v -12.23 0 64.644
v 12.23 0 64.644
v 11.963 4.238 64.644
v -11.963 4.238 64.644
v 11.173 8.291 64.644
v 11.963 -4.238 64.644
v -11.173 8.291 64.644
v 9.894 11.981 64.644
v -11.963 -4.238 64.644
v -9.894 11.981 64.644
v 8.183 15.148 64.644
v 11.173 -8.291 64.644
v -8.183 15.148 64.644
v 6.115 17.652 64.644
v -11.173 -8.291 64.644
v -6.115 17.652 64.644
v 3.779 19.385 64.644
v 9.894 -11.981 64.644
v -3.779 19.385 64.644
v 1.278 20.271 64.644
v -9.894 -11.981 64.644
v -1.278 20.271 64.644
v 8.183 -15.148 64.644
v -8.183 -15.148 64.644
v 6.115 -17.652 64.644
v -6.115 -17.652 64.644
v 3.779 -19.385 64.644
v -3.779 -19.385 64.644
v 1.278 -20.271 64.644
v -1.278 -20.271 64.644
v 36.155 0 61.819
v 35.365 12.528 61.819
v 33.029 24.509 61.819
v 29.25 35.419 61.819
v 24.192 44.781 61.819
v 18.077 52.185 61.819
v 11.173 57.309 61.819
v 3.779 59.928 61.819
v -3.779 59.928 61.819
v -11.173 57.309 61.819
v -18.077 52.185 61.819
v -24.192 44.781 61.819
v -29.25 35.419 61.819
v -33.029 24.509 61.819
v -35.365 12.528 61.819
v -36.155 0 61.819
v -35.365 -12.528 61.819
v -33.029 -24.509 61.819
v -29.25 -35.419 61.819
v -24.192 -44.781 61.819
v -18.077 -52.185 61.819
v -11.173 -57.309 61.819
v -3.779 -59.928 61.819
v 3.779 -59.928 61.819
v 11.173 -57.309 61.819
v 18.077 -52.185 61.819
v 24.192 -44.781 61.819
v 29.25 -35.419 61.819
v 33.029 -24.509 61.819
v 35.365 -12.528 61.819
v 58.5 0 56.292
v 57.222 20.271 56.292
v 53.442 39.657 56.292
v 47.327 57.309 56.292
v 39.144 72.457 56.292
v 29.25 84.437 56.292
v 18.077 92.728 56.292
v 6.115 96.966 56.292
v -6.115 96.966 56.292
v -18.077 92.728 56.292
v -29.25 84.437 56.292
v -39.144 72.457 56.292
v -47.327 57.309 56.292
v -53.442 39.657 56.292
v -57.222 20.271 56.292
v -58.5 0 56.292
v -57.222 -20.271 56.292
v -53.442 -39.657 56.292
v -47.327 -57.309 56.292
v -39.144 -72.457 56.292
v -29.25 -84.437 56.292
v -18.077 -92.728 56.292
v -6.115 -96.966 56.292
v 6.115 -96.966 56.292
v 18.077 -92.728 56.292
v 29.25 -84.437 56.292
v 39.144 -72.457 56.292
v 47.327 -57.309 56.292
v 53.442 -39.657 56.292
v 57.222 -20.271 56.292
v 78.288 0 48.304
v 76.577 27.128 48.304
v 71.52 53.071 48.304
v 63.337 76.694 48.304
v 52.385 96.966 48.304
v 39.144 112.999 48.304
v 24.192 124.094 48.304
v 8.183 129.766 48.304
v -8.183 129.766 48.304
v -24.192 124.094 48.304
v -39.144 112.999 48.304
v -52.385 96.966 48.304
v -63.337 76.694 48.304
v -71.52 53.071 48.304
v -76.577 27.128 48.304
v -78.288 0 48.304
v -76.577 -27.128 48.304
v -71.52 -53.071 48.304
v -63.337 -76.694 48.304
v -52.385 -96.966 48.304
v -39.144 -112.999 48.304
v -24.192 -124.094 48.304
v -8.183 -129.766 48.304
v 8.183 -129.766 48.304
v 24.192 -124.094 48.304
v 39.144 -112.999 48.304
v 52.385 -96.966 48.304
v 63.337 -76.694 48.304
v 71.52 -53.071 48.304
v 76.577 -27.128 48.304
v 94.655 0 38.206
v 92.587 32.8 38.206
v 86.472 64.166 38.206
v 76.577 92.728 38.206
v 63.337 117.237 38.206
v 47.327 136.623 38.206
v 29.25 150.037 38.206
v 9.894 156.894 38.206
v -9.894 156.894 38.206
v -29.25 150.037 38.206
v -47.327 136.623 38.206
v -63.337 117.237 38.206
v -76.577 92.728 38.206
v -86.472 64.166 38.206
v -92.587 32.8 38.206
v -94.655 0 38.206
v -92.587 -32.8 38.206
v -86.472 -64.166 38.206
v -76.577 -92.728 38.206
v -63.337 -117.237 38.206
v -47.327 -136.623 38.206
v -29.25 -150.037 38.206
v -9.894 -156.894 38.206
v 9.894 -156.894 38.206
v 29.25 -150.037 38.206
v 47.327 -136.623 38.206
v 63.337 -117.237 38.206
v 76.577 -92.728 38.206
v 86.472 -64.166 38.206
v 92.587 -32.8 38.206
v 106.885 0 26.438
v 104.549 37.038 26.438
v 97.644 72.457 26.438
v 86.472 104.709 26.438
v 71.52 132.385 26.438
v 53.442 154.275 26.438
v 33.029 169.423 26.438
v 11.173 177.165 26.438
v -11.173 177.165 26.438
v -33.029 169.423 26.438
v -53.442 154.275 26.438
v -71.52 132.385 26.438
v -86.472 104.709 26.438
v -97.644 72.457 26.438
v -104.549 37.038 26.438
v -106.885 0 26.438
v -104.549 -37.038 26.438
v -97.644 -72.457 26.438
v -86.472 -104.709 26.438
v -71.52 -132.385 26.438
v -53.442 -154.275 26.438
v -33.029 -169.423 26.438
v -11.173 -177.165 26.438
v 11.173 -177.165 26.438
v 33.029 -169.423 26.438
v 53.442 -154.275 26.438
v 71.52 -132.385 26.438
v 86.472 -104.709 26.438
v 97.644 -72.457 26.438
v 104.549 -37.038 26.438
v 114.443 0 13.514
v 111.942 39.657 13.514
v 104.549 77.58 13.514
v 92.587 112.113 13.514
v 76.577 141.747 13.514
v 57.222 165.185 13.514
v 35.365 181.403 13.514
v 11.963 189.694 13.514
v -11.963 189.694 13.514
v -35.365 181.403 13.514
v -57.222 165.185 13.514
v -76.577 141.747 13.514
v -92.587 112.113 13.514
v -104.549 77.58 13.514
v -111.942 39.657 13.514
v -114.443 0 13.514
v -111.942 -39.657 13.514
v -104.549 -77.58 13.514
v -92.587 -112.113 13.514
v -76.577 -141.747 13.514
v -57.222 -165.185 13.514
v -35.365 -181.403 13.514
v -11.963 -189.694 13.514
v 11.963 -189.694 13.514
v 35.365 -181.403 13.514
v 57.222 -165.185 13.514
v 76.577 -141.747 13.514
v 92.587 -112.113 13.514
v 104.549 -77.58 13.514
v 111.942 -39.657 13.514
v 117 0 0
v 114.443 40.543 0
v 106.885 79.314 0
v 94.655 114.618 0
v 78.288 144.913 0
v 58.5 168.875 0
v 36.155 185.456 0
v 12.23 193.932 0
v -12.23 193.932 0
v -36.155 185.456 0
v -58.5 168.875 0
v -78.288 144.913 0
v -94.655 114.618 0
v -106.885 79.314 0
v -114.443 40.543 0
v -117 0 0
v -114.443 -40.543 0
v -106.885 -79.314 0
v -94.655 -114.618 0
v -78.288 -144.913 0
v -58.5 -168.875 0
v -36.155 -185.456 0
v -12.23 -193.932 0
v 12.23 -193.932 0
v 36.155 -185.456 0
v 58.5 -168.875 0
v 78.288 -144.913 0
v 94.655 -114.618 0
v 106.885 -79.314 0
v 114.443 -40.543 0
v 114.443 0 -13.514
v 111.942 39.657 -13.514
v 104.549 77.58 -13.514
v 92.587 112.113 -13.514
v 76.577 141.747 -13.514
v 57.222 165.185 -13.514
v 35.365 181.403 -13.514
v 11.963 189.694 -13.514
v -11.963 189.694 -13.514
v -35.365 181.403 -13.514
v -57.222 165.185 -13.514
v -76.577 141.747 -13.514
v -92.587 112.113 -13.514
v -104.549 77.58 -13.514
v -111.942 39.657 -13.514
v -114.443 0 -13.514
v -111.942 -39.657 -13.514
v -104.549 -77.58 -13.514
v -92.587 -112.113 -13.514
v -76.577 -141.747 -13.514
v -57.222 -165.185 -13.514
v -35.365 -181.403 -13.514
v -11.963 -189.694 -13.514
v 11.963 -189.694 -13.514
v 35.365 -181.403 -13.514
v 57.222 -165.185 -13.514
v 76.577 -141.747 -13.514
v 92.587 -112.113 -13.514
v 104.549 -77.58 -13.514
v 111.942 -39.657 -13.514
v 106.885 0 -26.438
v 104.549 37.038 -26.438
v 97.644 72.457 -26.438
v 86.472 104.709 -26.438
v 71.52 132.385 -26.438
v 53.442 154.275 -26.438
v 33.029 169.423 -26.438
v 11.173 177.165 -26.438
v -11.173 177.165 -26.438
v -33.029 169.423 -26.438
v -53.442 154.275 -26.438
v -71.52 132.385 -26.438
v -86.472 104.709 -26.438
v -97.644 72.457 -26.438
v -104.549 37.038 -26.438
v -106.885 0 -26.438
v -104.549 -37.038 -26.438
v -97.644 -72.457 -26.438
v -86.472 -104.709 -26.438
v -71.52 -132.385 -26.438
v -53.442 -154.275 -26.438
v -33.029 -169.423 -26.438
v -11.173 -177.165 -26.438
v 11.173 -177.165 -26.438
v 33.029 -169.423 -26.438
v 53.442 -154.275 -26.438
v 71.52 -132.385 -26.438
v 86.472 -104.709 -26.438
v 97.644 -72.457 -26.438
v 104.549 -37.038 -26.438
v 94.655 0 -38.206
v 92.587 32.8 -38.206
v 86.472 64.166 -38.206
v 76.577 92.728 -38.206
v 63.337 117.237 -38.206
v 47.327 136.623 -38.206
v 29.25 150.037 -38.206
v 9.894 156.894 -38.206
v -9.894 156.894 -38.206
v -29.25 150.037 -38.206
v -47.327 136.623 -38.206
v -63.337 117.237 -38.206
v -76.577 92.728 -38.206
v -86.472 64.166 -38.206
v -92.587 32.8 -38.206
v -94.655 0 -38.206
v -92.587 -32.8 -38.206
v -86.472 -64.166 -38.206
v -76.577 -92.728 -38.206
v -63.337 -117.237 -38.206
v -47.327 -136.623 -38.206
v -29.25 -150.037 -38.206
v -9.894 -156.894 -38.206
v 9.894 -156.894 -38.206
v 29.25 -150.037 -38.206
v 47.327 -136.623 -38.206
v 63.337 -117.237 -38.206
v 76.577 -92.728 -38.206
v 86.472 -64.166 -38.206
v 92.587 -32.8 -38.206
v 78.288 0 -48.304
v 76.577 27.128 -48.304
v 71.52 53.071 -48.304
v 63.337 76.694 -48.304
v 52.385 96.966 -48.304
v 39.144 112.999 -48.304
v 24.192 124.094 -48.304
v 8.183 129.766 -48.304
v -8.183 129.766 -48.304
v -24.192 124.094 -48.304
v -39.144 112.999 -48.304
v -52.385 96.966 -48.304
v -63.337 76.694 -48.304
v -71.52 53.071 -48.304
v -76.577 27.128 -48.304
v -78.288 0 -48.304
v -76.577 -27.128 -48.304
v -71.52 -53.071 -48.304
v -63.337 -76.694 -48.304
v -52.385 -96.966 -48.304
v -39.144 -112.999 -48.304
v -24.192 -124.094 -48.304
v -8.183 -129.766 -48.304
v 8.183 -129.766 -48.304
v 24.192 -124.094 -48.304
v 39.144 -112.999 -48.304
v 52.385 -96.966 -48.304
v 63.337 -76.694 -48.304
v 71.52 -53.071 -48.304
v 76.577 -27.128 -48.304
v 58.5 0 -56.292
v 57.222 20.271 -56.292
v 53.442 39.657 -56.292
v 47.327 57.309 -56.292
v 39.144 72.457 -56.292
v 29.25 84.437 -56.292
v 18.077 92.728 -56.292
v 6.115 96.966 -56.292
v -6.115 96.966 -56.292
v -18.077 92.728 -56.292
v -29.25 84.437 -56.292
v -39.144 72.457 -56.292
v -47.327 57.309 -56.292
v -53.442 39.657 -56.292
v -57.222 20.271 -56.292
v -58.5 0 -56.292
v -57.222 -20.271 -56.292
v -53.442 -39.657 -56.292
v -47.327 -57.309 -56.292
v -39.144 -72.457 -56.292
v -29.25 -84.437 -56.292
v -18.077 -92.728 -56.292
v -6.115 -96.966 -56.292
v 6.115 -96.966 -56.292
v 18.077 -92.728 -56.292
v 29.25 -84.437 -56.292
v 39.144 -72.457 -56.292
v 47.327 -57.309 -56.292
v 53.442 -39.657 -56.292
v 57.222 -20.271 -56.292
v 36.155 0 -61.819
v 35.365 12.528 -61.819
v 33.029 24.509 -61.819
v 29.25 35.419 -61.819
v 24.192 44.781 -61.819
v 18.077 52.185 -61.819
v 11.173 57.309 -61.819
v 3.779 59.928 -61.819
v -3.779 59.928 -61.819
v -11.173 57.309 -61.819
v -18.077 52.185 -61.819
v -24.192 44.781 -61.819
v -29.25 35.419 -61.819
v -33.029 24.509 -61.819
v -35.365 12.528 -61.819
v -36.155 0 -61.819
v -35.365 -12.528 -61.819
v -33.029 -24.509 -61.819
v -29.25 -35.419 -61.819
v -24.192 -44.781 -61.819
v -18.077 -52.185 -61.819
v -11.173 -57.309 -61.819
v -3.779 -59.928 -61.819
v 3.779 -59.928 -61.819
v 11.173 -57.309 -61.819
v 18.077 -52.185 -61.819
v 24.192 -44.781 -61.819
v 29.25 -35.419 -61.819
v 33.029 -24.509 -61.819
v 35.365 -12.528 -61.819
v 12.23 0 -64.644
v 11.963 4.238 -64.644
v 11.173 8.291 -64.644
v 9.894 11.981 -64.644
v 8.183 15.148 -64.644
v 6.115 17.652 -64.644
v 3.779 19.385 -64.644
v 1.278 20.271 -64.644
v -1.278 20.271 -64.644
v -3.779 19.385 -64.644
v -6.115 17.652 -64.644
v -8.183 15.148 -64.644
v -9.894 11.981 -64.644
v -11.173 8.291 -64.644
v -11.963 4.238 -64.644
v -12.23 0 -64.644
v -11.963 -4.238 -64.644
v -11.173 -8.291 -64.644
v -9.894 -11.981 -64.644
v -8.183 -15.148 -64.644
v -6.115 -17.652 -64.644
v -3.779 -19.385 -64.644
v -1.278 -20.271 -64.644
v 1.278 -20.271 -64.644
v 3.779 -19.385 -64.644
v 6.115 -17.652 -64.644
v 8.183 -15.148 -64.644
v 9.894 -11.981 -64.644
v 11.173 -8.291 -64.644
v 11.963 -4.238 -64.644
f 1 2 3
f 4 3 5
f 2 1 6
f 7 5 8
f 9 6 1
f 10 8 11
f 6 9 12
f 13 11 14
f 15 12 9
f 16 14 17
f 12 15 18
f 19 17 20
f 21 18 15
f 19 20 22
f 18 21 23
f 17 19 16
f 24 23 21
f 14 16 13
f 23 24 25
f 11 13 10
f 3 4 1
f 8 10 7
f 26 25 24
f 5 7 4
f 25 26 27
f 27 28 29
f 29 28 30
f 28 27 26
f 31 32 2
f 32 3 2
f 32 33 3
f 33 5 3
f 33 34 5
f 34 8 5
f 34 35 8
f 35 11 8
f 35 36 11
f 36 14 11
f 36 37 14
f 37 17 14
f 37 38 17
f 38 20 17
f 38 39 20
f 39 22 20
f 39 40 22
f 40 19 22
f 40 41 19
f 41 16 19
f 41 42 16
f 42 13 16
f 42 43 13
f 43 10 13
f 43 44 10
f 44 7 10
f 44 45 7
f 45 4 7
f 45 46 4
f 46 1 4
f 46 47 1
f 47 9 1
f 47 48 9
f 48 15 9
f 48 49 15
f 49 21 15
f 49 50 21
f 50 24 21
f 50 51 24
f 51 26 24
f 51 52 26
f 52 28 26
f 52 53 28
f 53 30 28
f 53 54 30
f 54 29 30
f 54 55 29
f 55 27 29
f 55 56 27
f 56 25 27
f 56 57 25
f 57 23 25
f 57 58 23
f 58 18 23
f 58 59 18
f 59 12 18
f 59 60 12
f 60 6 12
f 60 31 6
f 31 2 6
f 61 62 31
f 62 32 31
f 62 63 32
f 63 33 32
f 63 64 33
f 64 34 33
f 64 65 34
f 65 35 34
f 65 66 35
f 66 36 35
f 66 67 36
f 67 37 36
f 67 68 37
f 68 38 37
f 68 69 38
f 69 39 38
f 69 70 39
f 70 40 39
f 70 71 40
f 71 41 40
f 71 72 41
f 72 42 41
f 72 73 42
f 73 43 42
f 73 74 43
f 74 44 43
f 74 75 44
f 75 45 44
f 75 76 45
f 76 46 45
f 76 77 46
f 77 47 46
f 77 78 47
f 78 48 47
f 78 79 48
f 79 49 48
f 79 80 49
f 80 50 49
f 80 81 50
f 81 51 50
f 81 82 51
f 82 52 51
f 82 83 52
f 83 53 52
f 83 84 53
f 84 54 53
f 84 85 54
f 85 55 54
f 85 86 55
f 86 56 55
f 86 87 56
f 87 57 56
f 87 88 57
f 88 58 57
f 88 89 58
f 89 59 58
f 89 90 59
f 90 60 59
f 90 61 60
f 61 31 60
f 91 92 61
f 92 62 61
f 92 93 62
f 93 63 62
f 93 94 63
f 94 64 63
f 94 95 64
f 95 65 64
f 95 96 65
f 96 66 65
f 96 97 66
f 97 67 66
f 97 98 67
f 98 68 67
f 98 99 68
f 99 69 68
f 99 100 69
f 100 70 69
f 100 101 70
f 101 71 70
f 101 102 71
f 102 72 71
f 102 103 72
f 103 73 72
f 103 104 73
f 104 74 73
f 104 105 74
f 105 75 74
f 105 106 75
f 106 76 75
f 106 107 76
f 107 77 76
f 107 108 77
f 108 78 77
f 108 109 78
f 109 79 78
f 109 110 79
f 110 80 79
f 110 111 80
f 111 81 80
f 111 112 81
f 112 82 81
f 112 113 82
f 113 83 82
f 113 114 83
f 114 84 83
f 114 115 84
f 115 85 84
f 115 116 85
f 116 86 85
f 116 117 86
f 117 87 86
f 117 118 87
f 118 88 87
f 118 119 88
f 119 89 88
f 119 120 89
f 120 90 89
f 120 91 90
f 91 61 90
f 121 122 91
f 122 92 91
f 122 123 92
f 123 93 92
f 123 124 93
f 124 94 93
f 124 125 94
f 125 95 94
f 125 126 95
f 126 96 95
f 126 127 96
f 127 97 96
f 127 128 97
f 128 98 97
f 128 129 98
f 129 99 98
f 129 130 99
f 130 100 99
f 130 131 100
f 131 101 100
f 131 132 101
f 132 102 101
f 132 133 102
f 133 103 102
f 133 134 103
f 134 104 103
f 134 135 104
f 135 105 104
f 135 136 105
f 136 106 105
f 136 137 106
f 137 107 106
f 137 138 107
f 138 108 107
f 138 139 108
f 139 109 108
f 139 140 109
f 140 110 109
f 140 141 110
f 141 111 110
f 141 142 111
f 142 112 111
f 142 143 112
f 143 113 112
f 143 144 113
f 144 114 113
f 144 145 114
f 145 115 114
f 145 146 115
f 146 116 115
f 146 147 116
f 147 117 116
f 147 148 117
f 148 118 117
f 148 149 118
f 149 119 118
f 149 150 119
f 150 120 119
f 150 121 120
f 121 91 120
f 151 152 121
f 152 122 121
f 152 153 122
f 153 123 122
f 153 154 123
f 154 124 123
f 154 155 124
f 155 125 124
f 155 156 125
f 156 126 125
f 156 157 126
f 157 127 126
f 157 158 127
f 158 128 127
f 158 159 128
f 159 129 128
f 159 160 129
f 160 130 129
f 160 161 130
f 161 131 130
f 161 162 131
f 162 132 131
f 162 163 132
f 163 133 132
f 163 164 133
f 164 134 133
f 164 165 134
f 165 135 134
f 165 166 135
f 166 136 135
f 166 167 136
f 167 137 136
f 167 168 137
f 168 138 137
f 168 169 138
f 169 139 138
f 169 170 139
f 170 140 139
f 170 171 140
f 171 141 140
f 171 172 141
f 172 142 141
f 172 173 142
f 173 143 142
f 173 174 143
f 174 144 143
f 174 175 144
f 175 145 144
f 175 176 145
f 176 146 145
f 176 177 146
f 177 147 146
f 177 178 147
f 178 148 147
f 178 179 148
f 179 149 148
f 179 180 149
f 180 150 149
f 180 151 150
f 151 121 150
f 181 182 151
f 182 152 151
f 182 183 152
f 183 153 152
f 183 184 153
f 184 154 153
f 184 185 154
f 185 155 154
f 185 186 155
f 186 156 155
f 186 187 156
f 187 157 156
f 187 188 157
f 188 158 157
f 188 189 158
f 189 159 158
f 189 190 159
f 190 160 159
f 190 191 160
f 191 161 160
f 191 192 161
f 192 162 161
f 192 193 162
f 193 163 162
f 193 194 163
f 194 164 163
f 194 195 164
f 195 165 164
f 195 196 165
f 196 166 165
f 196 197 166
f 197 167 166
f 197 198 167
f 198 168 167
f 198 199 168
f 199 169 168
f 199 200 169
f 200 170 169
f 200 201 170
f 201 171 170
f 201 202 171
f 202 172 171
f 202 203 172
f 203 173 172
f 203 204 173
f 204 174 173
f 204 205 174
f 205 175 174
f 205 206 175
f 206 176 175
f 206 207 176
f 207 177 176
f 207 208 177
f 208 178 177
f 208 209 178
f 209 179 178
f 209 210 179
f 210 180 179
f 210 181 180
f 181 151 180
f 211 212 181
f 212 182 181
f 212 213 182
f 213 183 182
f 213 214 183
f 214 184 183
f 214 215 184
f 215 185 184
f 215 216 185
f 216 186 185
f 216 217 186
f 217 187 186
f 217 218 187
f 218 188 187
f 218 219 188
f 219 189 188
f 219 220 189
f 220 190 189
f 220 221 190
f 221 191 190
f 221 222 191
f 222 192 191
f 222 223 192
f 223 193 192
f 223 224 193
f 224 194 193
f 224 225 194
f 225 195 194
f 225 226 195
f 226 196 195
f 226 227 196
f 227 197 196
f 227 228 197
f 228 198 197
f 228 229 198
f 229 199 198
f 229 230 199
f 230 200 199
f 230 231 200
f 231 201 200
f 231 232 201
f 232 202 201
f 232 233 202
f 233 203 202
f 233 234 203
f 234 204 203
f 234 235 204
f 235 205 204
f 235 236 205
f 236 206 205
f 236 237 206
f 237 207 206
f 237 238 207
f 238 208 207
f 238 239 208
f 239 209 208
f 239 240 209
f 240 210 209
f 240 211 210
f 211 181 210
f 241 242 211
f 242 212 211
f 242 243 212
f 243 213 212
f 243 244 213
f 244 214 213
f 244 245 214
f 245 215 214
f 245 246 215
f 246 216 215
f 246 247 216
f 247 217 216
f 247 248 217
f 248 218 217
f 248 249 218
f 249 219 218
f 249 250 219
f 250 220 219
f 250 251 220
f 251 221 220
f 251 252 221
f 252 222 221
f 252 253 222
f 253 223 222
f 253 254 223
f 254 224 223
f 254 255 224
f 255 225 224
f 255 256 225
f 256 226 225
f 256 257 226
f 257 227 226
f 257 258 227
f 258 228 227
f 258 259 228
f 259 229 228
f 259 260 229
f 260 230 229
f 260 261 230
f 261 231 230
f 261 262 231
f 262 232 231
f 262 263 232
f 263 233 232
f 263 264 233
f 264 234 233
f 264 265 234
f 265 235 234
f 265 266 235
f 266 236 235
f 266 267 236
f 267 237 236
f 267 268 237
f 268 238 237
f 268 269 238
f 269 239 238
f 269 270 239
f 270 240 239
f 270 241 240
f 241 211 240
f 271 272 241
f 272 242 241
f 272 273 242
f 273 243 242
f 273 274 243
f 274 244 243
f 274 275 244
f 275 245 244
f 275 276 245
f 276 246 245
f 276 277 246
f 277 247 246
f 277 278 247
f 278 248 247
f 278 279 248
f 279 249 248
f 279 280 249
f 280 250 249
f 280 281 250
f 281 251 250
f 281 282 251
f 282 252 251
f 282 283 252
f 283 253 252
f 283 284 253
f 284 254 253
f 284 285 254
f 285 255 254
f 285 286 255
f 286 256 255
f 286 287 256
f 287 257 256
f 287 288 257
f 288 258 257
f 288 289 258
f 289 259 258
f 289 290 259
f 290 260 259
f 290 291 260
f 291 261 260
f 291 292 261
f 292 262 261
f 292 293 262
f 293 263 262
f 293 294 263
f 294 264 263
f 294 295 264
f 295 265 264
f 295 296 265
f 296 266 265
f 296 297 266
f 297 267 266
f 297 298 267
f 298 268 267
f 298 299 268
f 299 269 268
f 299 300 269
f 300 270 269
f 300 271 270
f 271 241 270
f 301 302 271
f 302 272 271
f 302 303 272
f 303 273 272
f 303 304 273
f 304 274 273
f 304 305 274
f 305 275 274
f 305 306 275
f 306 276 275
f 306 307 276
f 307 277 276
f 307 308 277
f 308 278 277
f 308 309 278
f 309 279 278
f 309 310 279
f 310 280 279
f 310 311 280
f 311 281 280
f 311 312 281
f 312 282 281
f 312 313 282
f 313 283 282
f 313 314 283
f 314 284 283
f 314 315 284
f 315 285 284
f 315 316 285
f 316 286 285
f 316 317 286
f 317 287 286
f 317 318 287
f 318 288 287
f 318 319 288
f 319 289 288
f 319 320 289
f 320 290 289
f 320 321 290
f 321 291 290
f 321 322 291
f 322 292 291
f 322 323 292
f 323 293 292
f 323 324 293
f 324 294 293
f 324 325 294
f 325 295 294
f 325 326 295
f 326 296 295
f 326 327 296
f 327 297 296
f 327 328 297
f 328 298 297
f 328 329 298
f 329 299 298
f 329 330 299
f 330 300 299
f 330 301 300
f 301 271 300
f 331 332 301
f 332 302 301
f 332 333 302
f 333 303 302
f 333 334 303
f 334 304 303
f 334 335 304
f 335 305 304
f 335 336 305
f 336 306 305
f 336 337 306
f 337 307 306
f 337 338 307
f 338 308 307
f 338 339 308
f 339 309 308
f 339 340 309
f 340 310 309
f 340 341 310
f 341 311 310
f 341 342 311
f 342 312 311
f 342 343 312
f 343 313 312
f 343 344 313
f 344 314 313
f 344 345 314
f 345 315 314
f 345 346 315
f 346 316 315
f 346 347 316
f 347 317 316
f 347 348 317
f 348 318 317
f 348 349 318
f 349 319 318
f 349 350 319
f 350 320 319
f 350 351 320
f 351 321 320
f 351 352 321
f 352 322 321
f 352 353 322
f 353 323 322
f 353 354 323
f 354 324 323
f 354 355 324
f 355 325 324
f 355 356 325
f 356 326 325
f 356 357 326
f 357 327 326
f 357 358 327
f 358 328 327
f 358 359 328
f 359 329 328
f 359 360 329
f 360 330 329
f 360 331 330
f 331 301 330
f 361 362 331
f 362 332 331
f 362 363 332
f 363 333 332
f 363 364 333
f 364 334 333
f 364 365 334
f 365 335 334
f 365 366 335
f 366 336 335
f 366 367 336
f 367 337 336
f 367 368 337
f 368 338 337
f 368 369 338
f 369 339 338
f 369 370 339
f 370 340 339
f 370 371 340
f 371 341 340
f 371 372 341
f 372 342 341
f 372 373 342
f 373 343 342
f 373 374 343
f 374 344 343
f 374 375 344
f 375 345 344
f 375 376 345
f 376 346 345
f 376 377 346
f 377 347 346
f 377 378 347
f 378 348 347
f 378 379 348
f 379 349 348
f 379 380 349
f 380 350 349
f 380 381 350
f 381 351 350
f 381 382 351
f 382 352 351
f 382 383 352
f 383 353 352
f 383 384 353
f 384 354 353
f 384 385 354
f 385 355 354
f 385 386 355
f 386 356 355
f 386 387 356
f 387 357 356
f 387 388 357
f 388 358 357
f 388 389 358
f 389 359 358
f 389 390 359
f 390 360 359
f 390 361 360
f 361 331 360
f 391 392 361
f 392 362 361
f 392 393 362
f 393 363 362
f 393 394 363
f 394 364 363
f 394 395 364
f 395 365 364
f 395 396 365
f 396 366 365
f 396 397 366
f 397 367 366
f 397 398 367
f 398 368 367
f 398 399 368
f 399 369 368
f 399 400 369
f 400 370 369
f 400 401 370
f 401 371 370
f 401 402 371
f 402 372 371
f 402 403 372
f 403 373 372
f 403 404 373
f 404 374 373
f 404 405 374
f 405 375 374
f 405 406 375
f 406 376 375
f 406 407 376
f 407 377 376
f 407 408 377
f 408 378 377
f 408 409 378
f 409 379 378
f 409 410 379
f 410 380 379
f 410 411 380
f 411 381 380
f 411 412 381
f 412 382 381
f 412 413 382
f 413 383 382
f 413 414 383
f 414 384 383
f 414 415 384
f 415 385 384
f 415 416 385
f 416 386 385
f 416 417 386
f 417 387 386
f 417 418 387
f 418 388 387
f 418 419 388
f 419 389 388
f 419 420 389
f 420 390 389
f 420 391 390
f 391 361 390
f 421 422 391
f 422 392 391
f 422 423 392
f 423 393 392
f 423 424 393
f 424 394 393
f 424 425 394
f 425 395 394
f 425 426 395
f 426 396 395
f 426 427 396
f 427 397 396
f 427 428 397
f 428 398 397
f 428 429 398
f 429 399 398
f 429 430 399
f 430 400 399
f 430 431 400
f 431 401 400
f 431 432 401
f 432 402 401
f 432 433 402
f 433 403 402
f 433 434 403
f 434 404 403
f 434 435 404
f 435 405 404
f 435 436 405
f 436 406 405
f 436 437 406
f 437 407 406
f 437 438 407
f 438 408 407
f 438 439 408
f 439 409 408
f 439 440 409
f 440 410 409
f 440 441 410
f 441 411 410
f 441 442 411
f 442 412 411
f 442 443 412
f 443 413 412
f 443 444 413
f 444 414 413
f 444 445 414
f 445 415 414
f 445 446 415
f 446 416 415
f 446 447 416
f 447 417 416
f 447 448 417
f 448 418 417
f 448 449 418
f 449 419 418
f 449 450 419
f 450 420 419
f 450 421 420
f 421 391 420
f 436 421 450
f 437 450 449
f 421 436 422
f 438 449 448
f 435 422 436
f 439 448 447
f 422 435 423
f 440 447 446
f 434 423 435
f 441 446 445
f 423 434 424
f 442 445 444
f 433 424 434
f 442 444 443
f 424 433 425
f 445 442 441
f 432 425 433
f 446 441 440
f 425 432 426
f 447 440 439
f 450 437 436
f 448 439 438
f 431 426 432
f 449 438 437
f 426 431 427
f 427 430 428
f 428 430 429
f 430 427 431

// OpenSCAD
// Generated by SolidPython 1.0.1 on 2020-07-29 00:46:49


scale(v = [9, 15, 5]) {
	sphere(r = 13);
}
/***********************************************
*********      SolidPython code:      **********
************************************************
 
# import packages: SolidPython
from solid import *
from solid.utils import *
from itertools import chain, combinations, permutations


class Resize:

    def __init__(self, scad_file):
        self.scad_file = scad_file
        #self.scad_file = import_scad(scad_file)
        # cone/cylinder param:
        self.r1 = 0
        self.r2 = 0
        self.h = 0
        # rectangular prism param:
        self.w = 0
        self.l = 0
        # ellipse param:
        self.r = 0

    # import OpenScad code (file name corresponds to shape)


    # classify shape + parameters
    def assign(self, param1, param2, param3):
        if self.scad_file == 'cone.scad':
            self.r1 = param1
            self.r2 = param2
            self.h = param3
        elif self.scad_file == 'cylinder.scad':
            self.r1 = param1
            self.r2 = param2
            self.h = param3
        elif self.scad_file == 'rectangularPrism.scad':
            self.h = param1
            self.l = param2
            self.w = param3
        else:
            self.r = param1
            self.h = param2

    # resize parameters
    def iterate(self):
        x = range(3, 20, 2)
        i = 1
        if self.scad_file == 'cone.scad':
            tempList = list(permutations(x, 2))
            for temp in tempList:
                param1 = temp[0]
                param2 = temp[1]
                filepath = 'produced_scad_files/' + 'cone' + str(param1) + '_' + str(param2) + '_' + '.scad'
                scad_render_to_file(cylinder(h=param1, r1=param2, r2=0), filepath)

        elif self.scad_file == 'cylinder.scad':
            tempList = list(permutations(x, 3))
            for temp in tempList:
                param1 = temp[0]
                param2 = temp[1]
                filepath = 'produced_scad_files/' + 'cylinder' + str(param1) + '_' + str(param2) + '_' + '.scad'
                scad_render_to_file(cylinder(h=param1, r1=param2, r2=param2), filepath)

        elif self.scad_file == 'rectangularPrism.scad':
            tempList = list(permutations(x, 3))
            for temp in tempList:
                param1 = temp[0]
                param2 = temp[1]
                param3 = temp[2]
                filepath = 'produced_scad_files/' + 'rectangularPrism' + str(param1) + '_' + str(param2) + '_' + str(
                    param3) + '.scad'
                scad_render_to_file(cube(size=(param1, param2, param3)), filepath)

        elif self.scad_file == 'ellipse.scad':
            tempList = list(permutations(x, 4))
            for temp in tempList:
                param1 = temp[0]
                param2 = temp[1]
                param3 = temp[2]
                param4 = temp[3]
                filepath = 'produced_scad_files/' + 'ellipse' + str(param1) + '_' + str(param2) + '_' + str(param3) + '_' + str(param4) + '.scad'
                scad_render_to_file(scale([param1, param2, param3])(sphere(r=param4)), filepath)

    def render_to_scadfile(self):
        scad_render_to_file(scad, 'example.scad') 
 
************************************************/
